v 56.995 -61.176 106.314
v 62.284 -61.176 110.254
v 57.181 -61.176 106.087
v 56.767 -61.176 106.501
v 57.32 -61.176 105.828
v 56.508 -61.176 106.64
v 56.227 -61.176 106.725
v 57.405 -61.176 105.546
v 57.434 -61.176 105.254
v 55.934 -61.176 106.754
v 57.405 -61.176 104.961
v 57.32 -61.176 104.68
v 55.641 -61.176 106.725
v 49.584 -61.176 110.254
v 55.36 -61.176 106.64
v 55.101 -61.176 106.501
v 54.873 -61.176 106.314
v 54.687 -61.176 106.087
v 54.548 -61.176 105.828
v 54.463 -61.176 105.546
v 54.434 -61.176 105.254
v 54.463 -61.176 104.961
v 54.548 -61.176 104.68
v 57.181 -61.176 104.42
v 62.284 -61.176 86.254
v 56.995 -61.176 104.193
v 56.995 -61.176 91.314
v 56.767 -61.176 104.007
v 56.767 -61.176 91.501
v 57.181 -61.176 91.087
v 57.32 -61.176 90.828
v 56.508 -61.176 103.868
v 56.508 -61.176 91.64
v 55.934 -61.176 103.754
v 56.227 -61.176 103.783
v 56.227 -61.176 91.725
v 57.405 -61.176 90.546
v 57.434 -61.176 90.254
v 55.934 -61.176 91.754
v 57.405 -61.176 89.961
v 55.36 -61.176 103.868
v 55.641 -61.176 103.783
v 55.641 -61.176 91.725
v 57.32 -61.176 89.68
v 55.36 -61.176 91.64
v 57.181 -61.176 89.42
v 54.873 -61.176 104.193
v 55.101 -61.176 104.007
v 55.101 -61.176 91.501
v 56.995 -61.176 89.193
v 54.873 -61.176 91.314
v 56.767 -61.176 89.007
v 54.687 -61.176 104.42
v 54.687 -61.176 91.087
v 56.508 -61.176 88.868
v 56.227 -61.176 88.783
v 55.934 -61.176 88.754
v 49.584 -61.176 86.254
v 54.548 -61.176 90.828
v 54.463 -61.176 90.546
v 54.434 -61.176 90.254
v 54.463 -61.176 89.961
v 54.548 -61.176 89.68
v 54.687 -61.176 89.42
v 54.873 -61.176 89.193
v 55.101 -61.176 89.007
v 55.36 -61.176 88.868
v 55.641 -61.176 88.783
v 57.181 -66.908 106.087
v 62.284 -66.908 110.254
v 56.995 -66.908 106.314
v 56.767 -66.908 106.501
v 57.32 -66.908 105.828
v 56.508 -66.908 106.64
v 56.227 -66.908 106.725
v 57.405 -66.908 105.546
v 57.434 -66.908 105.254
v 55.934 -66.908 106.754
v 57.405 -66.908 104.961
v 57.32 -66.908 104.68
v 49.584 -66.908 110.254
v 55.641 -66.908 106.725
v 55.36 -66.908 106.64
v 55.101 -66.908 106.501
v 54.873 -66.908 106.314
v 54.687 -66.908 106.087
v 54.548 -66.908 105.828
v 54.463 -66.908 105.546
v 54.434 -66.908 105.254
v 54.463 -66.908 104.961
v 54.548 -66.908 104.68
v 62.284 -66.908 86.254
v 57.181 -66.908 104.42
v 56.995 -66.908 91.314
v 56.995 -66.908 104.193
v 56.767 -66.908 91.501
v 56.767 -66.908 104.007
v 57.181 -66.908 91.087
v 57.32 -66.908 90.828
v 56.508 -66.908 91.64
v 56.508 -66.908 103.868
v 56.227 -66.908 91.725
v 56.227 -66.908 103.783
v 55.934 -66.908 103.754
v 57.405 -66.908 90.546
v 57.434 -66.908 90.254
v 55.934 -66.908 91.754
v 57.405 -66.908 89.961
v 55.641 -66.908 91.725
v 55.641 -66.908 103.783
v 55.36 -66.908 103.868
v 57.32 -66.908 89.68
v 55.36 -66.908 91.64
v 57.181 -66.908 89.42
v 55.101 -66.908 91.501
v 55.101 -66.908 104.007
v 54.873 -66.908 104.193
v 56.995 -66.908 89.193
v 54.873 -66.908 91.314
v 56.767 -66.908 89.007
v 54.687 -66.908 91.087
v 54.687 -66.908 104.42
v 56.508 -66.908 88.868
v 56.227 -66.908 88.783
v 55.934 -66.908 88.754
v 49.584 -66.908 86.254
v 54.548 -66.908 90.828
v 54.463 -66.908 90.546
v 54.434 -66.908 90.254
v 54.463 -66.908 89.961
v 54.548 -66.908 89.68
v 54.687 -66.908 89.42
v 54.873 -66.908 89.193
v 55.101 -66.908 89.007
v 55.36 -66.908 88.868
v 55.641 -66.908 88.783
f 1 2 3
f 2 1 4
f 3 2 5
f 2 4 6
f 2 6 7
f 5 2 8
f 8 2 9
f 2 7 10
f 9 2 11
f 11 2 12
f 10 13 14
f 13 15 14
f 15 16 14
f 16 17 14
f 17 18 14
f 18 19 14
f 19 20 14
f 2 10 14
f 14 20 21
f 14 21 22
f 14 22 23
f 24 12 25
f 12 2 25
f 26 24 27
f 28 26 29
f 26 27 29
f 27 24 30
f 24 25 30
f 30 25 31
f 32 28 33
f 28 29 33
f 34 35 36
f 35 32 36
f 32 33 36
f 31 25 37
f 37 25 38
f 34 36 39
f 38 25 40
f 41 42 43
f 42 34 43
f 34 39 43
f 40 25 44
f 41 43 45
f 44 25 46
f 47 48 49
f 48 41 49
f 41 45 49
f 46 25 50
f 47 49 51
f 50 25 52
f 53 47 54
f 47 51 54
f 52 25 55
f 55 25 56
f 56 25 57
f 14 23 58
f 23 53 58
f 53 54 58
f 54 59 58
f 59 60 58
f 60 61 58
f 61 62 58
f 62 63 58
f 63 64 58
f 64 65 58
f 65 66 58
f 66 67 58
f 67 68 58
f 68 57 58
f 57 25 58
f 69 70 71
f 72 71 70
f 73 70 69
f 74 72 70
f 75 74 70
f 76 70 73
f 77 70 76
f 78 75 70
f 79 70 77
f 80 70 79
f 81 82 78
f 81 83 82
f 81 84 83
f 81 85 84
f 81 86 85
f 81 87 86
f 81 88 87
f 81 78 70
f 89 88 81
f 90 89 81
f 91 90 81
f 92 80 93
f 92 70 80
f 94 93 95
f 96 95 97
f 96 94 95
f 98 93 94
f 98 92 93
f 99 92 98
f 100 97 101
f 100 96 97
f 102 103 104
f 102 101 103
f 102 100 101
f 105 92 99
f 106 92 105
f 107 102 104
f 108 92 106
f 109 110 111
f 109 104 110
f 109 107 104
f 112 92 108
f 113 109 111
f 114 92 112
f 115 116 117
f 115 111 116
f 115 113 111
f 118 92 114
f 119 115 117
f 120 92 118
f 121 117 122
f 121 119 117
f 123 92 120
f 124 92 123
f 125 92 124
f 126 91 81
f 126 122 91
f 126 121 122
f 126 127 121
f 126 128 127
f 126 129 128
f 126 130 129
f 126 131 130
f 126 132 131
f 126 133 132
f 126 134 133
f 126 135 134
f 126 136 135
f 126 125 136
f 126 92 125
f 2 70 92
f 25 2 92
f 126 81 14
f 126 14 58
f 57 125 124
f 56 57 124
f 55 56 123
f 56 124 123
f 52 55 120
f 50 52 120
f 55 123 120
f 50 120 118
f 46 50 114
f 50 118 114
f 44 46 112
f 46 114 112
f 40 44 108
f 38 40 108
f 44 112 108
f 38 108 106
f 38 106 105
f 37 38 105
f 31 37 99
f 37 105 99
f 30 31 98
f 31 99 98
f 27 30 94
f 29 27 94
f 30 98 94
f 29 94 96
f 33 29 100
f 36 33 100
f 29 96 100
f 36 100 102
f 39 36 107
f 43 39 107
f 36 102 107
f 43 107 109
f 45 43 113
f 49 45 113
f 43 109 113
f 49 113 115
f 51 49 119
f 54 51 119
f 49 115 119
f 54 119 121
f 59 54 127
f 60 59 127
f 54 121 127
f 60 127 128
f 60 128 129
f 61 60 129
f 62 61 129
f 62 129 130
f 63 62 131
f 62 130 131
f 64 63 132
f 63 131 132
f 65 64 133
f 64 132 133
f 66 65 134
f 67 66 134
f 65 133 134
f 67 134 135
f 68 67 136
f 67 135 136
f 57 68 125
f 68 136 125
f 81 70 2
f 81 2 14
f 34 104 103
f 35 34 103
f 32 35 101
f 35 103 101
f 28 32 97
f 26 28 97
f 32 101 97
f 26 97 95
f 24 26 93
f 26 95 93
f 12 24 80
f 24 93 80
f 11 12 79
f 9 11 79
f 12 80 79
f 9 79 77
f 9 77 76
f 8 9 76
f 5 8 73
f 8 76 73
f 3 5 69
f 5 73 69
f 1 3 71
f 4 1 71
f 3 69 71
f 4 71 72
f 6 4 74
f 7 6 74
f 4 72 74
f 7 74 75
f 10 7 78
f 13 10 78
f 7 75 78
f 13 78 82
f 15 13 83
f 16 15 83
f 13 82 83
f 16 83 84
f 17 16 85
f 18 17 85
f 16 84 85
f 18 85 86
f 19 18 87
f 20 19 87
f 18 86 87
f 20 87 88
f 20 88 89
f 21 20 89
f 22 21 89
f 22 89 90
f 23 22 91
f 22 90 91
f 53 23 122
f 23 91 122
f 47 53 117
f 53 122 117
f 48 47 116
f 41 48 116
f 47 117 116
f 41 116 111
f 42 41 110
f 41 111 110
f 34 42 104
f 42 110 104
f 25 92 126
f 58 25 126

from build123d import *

# Parameters (mm, degrees)
SKETCH1_W           = 12.7
SKETCH1_H           = 24
SKETCH1_R           = 1.5
BOSS_EXTRUDE1_DEPTH = 5.731831


with BuildPart() as part:
    # Sketch1 → Boss-Extrude1 (new body)
    with BuildSketch(Plane(origin=(0, -66.907851618, 0), x_dir=(-1, 0, 0), z_dir=(0, -1, 0))):
        with Locations((-55.934056303, -98.2538327)):
            Rectangle(SKETCH1_W, SKETCH1_H)
        with Locations(Location((-55.934056303, -90.2538327, 0), (0, 0, 90))):
            Circle(SKETCH1_R, mode=Mode.SUBTRACT)
        with Locations(Location((-55.934056303, -105.2538327, 0), (0, 0, 90))):
            Circle(SKETCH1_R, mode=Mode.SUBTRACT)
    extrude(amount=-BOSS_EXTRUDE1_DEPTH)


solid = part.part
